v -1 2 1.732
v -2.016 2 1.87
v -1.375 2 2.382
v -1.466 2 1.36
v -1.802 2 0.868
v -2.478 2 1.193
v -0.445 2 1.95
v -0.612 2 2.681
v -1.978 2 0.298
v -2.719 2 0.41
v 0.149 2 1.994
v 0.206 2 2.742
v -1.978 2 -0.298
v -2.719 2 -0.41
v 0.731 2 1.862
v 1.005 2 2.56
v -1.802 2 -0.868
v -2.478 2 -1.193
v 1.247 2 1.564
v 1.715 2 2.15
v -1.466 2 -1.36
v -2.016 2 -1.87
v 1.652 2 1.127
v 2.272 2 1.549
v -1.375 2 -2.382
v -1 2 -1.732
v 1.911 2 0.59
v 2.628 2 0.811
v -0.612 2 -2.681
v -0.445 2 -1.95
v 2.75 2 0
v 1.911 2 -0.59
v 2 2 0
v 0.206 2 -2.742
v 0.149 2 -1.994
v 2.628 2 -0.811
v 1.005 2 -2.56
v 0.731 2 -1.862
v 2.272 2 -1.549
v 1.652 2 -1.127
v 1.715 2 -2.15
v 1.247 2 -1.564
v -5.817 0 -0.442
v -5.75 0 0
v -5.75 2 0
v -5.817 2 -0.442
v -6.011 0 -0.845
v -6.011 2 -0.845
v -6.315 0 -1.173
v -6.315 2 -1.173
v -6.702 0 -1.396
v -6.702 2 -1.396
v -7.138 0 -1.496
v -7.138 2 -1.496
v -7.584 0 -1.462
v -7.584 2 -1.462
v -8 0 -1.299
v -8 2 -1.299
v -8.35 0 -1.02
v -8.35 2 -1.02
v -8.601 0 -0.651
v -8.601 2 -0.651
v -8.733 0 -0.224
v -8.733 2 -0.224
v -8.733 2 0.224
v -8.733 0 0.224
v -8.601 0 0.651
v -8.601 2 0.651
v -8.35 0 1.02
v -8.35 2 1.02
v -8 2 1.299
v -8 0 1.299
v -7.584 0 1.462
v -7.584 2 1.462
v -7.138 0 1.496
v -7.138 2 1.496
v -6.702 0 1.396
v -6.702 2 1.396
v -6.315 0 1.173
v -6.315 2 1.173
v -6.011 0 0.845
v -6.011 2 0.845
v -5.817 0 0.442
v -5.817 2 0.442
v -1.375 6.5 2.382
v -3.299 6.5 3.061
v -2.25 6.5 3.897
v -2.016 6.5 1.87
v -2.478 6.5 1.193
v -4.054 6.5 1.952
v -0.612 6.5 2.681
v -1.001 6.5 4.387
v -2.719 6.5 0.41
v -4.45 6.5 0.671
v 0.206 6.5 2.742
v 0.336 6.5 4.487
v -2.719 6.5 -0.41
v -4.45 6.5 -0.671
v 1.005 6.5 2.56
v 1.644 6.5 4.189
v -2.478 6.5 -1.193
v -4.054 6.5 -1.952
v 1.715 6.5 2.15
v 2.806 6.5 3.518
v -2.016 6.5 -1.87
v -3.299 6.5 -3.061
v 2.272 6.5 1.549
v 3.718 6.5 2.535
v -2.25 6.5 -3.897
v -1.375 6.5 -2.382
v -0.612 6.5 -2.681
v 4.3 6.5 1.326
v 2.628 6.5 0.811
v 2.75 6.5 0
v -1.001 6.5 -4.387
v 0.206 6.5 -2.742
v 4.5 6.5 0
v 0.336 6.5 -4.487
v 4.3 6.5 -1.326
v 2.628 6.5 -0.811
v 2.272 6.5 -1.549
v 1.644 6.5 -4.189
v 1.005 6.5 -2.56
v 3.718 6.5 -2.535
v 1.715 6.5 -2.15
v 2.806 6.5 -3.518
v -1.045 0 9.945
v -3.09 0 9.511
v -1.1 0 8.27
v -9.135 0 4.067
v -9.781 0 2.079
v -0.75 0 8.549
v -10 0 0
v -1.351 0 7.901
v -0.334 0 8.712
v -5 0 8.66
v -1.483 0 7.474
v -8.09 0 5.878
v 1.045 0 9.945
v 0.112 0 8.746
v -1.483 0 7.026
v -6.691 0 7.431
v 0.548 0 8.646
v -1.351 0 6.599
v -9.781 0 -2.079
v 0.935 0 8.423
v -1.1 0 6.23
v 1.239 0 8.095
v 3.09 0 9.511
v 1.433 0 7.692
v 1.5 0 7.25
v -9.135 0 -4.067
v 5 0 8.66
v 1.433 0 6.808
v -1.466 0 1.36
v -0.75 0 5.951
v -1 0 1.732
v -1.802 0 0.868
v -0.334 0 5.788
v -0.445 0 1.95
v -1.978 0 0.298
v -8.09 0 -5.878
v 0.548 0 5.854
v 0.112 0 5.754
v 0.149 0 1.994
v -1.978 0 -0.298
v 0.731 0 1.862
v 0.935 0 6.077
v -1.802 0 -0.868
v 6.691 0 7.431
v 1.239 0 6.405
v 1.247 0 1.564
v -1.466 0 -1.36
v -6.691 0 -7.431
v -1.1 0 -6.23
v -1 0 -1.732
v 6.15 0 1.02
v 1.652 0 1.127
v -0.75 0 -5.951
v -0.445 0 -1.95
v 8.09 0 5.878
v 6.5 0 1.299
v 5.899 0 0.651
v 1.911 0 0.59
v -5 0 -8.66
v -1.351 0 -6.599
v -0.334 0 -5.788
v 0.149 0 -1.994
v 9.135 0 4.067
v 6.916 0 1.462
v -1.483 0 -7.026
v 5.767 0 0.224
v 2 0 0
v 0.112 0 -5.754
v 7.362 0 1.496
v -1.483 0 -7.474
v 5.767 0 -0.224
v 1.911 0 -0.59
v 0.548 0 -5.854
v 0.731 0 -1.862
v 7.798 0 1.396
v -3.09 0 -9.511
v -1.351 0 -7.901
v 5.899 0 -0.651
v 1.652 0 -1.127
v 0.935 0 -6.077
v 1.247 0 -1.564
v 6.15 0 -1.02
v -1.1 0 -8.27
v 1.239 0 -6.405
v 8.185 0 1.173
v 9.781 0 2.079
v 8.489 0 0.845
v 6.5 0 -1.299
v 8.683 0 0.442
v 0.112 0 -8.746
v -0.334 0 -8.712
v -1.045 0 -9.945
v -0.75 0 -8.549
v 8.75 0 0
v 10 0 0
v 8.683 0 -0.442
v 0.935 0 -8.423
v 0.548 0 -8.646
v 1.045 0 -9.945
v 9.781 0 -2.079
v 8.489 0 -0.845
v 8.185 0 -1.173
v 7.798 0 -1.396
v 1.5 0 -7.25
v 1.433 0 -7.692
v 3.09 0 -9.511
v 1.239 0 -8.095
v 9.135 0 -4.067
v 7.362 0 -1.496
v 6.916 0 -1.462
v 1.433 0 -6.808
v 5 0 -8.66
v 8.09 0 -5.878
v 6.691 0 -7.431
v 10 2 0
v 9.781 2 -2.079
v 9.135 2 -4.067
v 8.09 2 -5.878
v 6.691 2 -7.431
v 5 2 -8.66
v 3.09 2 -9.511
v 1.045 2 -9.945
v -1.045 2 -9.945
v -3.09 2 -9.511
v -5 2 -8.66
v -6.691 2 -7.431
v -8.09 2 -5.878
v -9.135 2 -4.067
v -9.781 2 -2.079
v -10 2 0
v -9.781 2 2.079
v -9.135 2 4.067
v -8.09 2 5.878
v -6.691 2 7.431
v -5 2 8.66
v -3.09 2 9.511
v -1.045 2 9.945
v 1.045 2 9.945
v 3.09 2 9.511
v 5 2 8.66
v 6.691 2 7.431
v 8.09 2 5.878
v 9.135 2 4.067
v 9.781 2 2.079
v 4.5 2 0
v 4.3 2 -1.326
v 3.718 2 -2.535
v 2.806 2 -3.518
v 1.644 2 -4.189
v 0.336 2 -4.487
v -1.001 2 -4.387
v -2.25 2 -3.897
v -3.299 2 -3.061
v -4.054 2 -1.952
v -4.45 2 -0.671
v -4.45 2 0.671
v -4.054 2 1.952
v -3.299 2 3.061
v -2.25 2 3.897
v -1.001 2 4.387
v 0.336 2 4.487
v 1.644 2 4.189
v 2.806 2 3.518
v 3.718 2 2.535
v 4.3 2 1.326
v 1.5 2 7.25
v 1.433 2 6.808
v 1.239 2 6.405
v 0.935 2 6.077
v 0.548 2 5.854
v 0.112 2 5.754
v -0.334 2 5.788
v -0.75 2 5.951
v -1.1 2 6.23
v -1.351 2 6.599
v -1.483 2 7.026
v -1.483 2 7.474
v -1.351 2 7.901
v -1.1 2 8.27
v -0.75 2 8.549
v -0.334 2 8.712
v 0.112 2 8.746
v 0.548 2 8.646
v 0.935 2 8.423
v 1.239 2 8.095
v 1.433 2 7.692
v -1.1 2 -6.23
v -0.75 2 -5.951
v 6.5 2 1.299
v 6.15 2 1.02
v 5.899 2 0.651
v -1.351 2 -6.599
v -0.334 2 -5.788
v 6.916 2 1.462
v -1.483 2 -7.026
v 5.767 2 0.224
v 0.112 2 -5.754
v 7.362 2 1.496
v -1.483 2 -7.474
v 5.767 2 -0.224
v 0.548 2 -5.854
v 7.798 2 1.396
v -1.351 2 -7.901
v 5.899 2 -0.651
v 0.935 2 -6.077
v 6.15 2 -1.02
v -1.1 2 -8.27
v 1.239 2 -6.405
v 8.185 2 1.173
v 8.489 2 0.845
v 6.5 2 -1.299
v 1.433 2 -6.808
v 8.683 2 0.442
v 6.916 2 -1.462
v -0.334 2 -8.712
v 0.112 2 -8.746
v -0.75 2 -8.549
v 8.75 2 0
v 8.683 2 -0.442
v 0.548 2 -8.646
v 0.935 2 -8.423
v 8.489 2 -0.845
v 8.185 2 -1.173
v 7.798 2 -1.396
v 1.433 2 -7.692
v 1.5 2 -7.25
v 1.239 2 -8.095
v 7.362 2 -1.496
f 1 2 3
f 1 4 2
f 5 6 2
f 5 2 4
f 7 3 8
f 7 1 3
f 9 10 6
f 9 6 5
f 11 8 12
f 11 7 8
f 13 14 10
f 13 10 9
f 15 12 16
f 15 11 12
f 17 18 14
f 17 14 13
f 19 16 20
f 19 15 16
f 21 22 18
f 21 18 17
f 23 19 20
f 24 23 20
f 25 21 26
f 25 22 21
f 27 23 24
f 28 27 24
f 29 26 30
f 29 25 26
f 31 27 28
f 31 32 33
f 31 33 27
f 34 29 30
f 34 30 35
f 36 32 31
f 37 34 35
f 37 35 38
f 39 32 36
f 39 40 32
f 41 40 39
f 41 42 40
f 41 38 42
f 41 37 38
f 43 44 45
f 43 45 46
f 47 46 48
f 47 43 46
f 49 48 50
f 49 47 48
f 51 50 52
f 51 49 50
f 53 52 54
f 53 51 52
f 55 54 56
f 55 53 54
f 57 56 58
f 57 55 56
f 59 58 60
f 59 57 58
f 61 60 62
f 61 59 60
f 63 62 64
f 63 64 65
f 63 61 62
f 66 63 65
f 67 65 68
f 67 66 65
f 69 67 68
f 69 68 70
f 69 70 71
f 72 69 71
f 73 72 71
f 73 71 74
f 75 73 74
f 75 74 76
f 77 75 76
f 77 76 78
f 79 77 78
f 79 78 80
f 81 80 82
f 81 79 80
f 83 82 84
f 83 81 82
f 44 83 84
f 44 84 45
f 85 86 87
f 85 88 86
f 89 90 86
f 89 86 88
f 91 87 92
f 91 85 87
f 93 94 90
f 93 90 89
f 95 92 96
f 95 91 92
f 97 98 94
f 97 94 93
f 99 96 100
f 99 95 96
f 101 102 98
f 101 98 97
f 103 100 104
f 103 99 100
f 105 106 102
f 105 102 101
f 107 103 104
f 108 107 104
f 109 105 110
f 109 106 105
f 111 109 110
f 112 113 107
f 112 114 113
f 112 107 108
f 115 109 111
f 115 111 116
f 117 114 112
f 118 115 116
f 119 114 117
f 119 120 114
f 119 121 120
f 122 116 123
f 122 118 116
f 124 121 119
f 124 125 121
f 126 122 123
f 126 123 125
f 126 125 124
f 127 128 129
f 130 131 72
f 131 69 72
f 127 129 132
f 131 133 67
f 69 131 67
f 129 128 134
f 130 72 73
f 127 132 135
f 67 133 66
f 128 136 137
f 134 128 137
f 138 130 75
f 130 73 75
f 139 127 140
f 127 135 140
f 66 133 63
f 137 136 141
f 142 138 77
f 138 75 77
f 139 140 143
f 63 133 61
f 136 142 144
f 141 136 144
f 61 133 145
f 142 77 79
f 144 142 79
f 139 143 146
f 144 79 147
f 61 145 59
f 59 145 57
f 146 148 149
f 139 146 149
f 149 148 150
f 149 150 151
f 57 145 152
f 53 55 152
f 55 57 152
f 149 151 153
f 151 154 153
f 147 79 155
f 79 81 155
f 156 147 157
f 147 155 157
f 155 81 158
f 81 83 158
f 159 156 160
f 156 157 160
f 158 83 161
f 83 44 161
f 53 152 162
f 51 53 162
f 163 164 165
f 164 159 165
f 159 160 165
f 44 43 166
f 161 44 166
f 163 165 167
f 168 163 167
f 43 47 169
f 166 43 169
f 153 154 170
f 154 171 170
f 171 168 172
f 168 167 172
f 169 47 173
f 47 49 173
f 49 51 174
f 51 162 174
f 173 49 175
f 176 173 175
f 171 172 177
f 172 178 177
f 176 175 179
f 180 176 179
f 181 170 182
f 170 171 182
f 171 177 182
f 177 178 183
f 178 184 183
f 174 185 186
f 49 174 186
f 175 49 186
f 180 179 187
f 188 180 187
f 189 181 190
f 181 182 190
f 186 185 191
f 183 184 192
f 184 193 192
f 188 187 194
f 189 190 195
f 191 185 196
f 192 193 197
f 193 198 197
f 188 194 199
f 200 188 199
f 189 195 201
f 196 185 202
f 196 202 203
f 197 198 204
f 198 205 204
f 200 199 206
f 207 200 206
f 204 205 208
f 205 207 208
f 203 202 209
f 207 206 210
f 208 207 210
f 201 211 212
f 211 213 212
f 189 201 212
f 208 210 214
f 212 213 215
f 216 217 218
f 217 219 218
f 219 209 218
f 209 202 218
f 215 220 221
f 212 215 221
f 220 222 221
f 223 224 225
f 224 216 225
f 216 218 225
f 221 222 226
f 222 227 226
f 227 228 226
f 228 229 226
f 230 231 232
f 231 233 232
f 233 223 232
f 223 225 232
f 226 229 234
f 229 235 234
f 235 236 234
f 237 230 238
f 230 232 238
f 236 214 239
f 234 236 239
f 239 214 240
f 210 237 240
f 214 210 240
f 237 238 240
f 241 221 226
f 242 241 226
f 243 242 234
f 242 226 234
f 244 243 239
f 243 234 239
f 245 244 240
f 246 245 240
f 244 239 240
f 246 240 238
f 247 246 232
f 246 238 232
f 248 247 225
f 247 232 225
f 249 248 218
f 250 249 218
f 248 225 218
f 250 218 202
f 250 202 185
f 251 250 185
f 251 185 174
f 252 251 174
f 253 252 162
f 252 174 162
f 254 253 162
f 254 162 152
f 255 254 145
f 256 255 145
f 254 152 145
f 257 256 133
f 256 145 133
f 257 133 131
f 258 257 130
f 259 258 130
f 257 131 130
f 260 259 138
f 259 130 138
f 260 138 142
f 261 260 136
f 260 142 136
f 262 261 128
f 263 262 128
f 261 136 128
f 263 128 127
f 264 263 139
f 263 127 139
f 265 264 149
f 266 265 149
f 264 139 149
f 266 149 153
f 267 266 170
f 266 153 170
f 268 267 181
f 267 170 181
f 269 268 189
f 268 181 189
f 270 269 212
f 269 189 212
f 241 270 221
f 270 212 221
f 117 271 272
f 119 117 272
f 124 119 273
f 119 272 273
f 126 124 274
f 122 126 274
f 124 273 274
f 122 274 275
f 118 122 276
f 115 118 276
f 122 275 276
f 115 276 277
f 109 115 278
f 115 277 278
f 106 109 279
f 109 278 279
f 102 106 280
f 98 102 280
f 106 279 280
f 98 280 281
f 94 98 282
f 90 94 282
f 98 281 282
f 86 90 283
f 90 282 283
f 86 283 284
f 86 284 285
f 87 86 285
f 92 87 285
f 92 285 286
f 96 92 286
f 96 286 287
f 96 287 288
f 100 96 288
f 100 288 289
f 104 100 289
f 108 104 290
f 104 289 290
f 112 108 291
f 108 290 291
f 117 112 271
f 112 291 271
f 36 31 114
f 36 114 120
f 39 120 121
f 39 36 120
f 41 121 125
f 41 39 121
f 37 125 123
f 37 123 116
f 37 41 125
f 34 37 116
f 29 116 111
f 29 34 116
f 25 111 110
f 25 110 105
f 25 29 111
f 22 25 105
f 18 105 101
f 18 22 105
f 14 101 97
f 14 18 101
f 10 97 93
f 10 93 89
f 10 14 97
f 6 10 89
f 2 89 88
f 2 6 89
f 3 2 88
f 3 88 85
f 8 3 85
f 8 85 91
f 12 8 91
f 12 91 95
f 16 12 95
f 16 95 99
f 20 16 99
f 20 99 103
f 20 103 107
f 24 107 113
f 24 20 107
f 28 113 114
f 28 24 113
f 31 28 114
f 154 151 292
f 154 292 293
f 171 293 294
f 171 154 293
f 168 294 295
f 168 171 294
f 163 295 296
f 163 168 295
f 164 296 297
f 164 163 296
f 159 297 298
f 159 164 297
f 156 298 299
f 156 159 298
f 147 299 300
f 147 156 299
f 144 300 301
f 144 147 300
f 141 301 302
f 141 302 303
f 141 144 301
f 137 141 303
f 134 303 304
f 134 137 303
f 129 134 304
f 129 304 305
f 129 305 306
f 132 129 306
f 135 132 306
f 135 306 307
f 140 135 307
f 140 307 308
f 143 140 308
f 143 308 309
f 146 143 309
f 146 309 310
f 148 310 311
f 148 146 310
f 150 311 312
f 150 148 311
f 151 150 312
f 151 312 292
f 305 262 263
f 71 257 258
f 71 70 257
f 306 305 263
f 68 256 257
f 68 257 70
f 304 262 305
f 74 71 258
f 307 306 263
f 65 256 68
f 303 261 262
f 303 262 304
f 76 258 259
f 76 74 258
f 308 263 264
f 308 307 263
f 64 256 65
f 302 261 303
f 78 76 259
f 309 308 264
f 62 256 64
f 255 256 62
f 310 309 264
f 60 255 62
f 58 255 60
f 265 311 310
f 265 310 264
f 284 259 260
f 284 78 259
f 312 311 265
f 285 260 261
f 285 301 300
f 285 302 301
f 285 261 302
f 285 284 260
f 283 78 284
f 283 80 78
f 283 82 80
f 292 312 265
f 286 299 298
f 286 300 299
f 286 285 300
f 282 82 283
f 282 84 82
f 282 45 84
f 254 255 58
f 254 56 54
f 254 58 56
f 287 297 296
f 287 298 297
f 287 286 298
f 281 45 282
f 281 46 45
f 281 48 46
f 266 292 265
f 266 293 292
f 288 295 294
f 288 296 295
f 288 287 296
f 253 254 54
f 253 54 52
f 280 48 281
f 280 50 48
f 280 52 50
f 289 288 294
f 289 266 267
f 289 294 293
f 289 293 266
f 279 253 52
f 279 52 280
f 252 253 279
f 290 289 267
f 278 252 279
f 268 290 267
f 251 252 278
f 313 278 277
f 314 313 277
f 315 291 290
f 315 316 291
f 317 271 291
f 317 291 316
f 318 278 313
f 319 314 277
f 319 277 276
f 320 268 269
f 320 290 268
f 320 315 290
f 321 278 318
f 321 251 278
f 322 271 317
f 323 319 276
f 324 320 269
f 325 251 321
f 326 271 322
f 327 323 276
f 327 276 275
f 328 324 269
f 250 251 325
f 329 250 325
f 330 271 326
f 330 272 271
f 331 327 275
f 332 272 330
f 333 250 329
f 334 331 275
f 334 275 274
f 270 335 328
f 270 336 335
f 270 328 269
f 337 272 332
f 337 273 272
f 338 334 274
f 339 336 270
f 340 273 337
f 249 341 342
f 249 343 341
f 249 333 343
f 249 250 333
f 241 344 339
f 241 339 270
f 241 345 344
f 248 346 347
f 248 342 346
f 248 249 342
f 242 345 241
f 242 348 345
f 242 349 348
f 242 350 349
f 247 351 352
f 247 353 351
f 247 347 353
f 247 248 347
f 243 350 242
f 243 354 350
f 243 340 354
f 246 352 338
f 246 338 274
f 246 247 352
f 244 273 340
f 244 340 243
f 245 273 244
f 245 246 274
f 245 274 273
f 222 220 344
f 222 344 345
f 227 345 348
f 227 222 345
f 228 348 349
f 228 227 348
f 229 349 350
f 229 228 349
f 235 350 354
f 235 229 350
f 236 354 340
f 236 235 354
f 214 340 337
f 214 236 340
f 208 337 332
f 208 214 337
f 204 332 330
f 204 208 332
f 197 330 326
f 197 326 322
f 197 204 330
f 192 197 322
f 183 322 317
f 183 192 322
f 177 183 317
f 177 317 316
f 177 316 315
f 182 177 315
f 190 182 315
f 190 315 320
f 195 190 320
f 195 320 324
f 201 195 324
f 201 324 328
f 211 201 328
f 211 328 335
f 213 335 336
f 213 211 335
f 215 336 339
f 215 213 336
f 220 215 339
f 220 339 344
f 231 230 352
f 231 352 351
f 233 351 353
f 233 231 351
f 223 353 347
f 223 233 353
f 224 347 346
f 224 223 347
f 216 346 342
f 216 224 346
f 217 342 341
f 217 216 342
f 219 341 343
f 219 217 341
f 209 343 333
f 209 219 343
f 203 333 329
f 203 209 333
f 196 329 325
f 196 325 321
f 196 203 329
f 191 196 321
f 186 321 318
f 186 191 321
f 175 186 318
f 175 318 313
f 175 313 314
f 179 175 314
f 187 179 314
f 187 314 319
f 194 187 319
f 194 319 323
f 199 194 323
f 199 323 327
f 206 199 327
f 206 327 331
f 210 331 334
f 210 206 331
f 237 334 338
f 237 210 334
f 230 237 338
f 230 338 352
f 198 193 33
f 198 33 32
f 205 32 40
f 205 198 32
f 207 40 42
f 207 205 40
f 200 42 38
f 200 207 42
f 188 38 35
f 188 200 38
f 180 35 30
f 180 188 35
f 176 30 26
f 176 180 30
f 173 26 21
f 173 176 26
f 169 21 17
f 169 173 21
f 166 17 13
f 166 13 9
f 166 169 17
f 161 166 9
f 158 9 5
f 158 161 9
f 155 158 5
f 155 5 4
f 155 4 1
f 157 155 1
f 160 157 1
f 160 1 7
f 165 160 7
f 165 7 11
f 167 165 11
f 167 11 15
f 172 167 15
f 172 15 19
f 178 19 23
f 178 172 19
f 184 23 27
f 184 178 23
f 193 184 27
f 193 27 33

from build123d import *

# Parameters (mm, degrees)
SKETCH1_R           = 10
SKETCH1_R_2         = 1.5
SKETCH1_R_3         = 2
BOSS_EXTRUDE1_DEPTH = 2
SKETCH2_R           = 4.5
SKETCH2_R_2         = 2.75
BOSS_EXTRUDE2_DEPTH = 4.5


with BuildPart() as part:
    # Sketch1 → Boss-Extrude1 (new body)
    with BuildSketch(Plane(origin=(0, 0, 0), x_dir=(1, 0, 0), z_dir=(0, 1, 0))):
        Circle(SKETCH1_R)
        with Locations((-7.25, 0)):
            Circle(SKETCH1_R_2, mode=Mode.SUBTRACT)
        with Locations((0, 7.25)):
            Circle(SKETCH1_R_2, mode=Mode.SUBTRACT)
        with Locations((7.25, 0)):
            Circle(SKETCH1_R_2, mode=Mode.SUBTRACT)
        with Locations((0, -7.25)):
            Circle(SKETCH1_R_2, mode=Mode.SUBTRACT)
        Circle(SKETCH1_R_3, mode=Mode.SUBTRACT)
    extrude(amount=BOSS_EXTRUDE1_DEPTH)

    # Sketch2 → Boss-Extrude2 (add)
    with BuildSketch(Plane(origin=(0, 2, 0), x_dir=(1, 0, 0), z_dir=(0, 1, 0))):
        Circle(SKETCH2_R)
        Circle(SKETCH2_R_2, mode=Mode.SUBTRACT)
    extrude(amount=BOSS_EXTRUDE2_DEPTH)


solid = part.part
